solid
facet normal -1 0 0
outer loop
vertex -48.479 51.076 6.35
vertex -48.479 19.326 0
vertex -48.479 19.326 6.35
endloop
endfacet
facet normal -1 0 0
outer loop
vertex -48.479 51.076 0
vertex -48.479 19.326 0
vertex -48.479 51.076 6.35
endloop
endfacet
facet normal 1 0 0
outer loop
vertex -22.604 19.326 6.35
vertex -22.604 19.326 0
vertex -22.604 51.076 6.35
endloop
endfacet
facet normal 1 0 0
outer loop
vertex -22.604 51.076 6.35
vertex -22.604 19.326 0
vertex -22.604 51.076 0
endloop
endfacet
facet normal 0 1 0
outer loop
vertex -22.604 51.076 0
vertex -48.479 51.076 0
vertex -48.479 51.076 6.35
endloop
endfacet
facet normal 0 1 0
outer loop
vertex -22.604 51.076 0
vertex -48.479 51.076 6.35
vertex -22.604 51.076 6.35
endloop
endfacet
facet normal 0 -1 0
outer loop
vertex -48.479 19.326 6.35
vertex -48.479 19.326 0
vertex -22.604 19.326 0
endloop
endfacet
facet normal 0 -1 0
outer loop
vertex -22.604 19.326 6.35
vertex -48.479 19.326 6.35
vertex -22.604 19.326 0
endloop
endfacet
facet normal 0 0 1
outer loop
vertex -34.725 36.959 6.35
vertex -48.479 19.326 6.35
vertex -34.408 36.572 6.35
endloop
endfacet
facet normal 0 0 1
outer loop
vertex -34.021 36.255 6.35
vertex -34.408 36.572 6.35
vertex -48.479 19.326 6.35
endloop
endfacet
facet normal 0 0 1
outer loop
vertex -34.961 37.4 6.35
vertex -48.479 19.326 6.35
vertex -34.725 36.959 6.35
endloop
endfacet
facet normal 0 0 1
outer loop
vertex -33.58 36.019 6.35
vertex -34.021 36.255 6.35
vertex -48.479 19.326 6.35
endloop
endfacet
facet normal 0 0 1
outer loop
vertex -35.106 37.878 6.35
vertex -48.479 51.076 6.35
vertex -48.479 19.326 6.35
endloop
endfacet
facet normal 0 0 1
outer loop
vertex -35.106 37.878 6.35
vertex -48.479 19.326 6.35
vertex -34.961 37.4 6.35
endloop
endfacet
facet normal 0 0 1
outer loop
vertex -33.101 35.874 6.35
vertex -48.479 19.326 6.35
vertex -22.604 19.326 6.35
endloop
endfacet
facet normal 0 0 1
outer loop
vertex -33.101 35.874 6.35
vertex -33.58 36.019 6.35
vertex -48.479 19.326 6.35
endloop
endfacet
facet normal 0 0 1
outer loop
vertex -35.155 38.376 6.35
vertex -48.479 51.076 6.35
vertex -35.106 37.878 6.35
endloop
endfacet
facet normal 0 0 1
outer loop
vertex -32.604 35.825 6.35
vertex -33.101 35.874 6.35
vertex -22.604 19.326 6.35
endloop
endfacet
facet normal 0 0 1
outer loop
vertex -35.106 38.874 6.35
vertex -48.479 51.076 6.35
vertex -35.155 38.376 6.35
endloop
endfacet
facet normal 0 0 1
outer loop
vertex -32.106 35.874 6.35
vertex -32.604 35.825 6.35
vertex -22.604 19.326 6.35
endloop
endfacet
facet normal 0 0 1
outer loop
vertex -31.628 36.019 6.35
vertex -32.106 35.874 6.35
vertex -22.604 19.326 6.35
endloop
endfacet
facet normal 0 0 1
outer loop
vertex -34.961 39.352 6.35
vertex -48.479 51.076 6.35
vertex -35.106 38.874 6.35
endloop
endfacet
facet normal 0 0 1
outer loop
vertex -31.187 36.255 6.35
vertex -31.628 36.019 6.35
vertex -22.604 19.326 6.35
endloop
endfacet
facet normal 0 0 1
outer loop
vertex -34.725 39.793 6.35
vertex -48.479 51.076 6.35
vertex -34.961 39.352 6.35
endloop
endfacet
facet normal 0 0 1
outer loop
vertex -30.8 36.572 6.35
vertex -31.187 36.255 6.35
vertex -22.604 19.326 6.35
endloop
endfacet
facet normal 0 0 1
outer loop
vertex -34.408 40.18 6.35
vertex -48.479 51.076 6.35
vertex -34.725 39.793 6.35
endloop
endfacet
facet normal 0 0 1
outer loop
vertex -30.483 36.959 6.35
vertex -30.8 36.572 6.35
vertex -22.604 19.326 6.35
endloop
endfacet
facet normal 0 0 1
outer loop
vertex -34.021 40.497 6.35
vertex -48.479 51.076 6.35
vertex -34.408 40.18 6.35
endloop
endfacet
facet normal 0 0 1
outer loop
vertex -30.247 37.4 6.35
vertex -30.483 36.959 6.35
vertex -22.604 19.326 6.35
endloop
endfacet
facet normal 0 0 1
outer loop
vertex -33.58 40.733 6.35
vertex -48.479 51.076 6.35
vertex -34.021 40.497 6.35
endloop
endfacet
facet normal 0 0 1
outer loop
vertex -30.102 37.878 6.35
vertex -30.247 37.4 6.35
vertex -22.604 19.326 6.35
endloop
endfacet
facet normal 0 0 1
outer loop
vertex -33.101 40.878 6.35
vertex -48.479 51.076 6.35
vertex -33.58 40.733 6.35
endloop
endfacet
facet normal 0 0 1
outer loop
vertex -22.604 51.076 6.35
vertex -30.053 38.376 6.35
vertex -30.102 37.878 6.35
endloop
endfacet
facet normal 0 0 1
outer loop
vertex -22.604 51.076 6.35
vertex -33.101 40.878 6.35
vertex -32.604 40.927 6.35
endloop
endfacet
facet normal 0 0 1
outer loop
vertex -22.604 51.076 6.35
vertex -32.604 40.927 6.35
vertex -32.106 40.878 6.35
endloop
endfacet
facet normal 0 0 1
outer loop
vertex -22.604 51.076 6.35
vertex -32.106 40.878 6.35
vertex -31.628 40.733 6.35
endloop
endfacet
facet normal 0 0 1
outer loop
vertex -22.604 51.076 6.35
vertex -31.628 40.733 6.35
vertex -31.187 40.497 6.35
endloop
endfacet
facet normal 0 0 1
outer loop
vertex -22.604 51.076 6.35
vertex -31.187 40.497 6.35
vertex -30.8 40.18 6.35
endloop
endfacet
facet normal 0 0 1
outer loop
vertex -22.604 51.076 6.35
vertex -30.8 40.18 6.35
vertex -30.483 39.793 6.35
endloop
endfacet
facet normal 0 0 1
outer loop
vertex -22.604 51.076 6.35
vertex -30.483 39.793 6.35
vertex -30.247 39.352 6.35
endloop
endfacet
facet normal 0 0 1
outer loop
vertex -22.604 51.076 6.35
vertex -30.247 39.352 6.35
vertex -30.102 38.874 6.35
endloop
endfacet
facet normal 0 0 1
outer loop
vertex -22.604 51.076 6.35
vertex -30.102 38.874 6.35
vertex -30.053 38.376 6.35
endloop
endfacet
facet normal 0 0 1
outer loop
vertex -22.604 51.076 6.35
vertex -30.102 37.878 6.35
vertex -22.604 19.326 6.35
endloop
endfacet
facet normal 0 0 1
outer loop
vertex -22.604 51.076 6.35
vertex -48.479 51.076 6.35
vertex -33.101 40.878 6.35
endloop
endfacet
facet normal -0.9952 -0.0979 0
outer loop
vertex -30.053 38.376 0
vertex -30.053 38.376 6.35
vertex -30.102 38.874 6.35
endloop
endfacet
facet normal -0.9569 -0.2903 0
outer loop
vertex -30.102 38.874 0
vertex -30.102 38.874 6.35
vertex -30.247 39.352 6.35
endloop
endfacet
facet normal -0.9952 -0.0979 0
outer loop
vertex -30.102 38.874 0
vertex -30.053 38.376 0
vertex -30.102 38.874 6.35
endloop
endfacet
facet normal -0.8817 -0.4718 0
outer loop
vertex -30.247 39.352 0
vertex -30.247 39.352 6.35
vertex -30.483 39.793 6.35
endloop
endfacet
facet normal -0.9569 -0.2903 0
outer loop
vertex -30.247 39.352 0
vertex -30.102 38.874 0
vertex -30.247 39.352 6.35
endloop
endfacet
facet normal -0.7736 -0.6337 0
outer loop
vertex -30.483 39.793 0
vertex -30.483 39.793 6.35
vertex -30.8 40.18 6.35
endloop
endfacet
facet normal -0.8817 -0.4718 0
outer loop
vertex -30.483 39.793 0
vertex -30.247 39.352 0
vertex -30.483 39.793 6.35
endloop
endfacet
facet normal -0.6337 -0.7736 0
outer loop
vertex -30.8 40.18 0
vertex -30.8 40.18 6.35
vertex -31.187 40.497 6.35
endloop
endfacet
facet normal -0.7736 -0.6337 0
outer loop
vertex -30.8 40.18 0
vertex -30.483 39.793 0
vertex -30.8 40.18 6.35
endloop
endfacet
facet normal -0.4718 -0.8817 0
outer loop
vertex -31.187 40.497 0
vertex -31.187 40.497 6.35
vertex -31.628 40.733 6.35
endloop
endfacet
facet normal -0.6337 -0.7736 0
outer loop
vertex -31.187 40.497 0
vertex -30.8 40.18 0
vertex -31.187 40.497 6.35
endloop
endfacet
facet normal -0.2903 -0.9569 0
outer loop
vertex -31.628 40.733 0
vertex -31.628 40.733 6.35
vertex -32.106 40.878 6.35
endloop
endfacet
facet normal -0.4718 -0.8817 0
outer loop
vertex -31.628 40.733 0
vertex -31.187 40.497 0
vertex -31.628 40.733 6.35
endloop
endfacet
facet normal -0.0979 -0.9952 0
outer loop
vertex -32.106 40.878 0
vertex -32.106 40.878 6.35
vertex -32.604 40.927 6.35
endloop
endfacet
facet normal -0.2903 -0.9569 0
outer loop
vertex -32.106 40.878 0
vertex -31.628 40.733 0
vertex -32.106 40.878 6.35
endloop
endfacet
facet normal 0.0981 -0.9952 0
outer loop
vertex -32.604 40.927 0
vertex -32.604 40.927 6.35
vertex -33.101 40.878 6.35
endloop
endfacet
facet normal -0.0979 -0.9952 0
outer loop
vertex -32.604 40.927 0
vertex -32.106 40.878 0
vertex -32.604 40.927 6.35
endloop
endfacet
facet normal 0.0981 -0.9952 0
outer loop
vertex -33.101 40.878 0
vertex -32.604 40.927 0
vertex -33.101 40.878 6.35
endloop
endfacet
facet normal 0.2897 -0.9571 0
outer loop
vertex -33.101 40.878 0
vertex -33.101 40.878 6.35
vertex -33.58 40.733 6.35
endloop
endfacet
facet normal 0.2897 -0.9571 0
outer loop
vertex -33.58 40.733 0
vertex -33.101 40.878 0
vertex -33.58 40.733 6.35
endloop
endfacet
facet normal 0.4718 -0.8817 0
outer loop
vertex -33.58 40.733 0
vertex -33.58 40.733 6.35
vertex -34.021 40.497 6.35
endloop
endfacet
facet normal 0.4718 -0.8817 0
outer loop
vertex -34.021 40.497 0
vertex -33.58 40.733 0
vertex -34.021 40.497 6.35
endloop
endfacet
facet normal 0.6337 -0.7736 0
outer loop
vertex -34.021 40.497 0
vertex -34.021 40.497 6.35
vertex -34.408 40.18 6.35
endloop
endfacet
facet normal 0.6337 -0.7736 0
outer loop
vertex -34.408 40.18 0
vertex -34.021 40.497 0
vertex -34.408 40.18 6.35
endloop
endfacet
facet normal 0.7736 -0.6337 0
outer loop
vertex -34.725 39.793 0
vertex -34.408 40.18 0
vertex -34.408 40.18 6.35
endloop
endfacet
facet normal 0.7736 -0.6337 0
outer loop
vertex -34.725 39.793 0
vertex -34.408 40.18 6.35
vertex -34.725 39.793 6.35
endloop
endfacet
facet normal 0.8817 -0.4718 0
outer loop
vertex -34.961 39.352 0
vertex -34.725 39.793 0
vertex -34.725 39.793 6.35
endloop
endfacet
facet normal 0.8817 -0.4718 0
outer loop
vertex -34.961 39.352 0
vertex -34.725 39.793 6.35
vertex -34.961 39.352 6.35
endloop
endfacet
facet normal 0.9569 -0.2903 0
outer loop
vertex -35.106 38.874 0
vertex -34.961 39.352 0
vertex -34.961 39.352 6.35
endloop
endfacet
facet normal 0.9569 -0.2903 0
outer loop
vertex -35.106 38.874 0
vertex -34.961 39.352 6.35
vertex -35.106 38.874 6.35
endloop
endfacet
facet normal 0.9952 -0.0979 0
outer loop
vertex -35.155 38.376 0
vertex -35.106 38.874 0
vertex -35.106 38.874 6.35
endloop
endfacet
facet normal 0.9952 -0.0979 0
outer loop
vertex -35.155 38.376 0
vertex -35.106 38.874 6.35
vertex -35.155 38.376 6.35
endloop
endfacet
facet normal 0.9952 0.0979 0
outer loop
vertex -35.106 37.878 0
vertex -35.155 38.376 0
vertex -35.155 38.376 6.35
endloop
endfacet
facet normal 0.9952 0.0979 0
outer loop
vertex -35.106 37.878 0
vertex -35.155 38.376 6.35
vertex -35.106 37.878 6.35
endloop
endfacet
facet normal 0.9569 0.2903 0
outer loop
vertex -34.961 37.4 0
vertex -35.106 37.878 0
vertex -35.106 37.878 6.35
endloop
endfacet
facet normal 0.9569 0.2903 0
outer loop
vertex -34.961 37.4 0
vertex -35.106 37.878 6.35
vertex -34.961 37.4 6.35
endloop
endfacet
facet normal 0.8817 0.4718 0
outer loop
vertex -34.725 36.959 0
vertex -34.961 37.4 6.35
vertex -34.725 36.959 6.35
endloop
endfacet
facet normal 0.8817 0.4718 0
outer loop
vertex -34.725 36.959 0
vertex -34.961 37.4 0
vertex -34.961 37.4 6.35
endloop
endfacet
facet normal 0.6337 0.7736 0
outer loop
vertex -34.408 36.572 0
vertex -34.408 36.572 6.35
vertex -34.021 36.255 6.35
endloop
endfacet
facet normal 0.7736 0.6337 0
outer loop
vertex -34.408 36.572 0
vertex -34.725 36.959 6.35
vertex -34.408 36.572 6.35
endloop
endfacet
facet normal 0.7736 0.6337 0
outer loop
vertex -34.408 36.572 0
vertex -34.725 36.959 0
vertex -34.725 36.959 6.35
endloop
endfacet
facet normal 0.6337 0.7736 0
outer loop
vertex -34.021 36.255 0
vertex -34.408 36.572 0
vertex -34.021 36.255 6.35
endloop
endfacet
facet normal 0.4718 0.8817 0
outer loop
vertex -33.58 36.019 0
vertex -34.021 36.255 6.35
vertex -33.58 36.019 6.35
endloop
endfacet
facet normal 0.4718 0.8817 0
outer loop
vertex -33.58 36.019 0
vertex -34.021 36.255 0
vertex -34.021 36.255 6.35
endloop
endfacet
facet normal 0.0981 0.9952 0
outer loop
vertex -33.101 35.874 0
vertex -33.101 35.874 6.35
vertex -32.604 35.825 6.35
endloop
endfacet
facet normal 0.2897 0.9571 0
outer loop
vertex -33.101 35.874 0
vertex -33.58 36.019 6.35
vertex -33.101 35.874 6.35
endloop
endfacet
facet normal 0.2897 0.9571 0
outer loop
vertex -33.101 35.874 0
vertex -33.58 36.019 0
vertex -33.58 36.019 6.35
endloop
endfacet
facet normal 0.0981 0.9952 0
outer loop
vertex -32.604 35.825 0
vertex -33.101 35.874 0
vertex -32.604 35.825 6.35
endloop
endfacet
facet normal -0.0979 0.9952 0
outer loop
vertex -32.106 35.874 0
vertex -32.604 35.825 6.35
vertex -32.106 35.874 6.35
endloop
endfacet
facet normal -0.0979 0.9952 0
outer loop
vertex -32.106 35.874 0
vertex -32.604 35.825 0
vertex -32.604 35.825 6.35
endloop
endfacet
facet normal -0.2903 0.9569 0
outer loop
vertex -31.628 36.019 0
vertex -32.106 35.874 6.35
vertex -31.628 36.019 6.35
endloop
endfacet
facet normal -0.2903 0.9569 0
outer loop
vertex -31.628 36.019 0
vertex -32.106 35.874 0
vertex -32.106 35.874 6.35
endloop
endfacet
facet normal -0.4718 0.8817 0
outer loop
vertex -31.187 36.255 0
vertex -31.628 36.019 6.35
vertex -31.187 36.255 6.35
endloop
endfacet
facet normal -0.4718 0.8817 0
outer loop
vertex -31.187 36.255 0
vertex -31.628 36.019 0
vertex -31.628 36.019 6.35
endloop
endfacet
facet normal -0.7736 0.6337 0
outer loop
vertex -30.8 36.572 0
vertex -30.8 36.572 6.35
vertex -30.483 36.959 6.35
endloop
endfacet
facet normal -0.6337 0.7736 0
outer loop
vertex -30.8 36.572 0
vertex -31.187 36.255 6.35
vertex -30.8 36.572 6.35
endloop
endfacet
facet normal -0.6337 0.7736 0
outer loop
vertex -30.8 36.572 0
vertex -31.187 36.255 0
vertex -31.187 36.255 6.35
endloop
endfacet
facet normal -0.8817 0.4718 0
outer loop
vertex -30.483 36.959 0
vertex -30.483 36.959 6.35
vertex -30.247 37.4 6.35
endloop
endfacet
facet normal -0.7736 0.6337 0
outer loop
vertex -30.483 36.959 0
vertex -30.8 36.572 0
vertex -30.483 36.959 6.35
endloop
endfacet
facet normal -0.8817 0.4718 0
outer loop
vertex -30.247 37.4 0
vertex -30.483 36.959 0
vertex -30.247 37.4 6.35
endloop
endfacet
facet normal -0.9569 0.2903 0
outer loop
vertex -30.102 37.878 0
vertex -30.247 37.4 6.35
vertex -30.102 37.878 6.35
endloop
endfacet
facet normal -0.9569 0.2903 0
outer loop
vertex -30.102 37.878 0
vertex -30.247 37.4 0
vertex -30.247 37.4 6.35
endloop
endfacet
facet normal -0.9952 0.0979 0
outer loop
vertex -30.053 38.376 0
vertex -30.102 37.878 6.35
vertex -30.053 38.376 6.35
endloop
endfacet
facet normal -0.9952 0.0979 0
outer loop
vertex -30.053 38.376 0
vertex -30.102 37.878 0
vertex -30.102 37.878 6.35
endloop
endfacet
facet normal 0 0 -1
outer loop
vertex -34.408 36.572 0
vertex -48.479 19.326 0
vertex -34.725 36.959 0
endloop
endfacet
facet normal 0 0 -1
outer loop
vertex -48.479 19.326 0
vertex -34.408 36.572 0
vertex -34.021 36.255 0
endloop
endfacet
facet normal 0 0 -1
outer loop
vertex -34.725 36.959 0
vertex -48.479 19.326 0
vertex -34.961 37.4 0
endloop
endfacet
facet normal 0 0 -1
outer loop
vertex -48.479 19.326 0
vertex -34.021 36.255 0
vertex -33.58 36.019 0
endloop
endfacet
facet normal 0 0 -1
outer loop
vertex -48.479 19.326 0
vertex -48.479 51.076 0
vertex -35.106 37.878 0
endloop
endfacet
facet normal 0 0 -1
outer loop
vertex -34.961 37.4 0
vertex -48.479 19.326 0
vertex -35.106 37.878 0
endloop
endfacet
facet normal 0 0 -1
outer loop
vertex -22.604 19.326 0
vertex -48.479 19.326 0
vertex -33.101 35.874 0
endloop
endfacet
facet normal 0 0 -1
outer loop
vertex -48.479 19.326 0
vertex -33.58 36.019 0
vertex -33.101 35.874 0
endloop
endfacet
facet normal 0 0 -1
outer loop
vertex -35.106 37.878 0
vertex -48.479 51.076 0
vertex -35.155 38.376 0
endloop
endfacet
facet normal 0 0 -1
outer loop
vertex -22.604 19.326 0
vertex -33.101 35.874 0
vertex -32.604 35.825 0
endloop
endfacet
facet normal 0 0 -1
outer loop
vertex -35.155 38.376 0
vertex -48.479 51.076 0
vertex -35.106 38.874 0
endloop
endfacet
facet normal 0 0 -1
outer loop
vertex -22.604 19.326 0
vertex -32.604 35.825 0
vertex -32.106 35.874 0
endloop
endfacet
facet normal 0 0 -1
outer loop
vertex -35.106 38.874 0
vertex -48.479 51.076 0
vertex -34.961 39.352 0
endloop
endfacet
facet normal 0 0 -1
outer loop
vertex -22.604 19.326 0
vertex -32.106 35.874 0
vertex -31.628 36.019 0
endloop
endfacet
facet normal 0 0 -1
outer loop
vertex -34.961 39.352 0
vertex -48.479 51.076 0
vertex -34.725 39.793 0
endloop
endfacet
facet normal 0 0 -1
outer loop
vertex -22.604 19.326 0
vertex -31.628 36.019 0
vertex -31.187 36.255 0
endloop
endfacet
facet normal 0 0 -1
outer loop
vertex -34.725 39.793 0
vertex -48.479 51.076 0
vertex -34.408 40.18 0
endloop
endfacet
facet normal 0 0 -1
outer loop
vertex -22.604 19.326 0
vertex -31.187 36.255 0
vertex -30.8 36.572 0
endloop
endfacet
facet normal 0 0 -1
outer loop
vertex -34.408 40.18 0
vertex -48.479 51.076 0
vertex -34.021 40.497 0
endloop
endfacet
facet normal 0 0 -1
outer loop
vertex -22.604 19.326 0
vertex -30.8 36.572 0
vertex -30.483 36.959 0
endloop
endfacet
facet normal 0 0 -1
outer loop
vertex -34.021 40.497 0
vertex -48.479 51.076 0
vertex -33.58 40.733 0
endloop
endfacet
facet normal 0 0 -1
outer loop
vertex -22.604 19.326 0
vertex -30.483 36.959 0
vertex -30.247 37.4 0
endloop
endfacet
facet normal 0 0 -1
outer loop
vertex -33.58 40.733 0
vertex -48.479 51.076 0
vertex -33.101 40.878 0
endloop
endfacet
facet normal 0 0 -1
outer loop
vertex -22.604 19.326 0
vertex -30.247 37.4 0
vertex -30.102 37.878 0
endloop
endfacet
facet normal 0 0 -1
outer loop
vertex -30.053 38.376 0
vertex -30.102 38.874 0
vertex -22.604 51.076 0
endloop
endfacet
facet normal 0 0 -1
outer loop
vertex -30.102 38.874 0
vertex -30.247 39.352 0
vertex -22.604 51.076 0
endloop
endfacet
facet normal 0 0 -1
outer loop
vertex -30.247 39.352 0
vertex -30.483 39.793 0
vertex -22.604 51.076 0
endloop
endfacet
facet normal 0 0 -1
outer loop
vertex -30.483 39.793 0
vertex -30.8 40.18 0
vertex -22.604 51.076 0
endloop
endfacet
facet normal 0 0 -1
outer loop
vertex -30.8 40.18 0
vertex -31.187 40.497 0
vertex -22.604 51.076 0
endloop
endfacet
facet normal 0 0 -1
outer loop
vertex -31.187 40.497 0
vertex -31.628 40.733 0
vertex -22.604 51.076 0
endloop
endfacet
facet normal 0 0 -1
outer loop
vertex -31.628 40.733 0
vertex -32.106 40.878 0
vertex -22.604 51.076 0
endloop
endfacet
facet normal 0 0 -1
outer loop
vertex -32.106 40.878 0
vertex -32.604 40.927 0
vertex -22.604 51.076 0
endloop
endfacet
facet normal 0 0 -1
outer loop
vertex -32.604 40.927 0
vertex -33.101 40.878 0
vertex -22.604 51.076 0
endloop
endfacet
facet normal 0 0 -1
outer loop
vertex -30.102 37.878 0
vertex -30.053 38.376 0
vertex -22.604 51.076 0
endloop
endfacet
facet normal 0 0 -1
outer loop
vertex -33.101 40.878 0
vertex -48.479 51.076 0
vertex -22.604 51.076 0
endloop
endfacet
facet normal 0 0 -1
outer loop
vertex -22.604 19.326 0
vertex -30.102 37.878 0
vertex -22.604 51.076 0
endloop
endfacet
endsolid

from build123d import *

# Parameters (mm, degrees)
SKETCH1_W             = 25.875
SKETCH1_H             = 31.75
BOSS_EXTRUDE1_DEPTH   = 6.35
SKETCH1_4_OUTSIDE_W   = 36.165
SKETCH1_4_OUTSIDE_H   = 42.04
SKETCH1_4_OUTSIDE_W_2 = 25.875
SKETCH1_4_OUTSIDE_H_2 = 31.75
SKETCH1_4_OUTSIDE_R   = 2.551011908
CUT_EXTRUDE3_DEPTH    = 71.705469941


with BuildPart() as part:
    # Sketch1 → Boss-Extrude1 (new body)
    with BuildSketch(Plane.XY):
        with Locations((-35.541307617, 35.200886597)):
            Rectangle(SKETCH1_W, SKETCH1_H)
    extrude(amount=BOSS_EXTRUDE1_DEPTH)

    # Sketch1<4> outside → Cut-Extrude3 (cut, through all)
    # profile 1 of 2: a face of its own
    with BuildSketch(Plane.XY):
        with Locations((-35.5415, 35.201)):
            Rectangle(SKETCH1_4_OUTSIDE_W, SKETCH1_4_OUTSIDE_H)
        with Locations((-35.541307617, 35.200886597)):
            Rectangle(SKETCH1_4_OUTSIDE_W_2, SKETCH1_4_OUTSIDE_H_2, mode=Mode.SUBTRACT)
    # profile 2 of 2: a face of its own
    with BuildSketch(Plane.XY):
        with Locations((-32.603807617, 38.375886597)):
            Circle(SKETCH1_4_OUTSIDE_R)
    extrude(amount=CUT_EXTRUDE3_DEPTH, mode=Mode.SUBTRACT)


solid = part.part
